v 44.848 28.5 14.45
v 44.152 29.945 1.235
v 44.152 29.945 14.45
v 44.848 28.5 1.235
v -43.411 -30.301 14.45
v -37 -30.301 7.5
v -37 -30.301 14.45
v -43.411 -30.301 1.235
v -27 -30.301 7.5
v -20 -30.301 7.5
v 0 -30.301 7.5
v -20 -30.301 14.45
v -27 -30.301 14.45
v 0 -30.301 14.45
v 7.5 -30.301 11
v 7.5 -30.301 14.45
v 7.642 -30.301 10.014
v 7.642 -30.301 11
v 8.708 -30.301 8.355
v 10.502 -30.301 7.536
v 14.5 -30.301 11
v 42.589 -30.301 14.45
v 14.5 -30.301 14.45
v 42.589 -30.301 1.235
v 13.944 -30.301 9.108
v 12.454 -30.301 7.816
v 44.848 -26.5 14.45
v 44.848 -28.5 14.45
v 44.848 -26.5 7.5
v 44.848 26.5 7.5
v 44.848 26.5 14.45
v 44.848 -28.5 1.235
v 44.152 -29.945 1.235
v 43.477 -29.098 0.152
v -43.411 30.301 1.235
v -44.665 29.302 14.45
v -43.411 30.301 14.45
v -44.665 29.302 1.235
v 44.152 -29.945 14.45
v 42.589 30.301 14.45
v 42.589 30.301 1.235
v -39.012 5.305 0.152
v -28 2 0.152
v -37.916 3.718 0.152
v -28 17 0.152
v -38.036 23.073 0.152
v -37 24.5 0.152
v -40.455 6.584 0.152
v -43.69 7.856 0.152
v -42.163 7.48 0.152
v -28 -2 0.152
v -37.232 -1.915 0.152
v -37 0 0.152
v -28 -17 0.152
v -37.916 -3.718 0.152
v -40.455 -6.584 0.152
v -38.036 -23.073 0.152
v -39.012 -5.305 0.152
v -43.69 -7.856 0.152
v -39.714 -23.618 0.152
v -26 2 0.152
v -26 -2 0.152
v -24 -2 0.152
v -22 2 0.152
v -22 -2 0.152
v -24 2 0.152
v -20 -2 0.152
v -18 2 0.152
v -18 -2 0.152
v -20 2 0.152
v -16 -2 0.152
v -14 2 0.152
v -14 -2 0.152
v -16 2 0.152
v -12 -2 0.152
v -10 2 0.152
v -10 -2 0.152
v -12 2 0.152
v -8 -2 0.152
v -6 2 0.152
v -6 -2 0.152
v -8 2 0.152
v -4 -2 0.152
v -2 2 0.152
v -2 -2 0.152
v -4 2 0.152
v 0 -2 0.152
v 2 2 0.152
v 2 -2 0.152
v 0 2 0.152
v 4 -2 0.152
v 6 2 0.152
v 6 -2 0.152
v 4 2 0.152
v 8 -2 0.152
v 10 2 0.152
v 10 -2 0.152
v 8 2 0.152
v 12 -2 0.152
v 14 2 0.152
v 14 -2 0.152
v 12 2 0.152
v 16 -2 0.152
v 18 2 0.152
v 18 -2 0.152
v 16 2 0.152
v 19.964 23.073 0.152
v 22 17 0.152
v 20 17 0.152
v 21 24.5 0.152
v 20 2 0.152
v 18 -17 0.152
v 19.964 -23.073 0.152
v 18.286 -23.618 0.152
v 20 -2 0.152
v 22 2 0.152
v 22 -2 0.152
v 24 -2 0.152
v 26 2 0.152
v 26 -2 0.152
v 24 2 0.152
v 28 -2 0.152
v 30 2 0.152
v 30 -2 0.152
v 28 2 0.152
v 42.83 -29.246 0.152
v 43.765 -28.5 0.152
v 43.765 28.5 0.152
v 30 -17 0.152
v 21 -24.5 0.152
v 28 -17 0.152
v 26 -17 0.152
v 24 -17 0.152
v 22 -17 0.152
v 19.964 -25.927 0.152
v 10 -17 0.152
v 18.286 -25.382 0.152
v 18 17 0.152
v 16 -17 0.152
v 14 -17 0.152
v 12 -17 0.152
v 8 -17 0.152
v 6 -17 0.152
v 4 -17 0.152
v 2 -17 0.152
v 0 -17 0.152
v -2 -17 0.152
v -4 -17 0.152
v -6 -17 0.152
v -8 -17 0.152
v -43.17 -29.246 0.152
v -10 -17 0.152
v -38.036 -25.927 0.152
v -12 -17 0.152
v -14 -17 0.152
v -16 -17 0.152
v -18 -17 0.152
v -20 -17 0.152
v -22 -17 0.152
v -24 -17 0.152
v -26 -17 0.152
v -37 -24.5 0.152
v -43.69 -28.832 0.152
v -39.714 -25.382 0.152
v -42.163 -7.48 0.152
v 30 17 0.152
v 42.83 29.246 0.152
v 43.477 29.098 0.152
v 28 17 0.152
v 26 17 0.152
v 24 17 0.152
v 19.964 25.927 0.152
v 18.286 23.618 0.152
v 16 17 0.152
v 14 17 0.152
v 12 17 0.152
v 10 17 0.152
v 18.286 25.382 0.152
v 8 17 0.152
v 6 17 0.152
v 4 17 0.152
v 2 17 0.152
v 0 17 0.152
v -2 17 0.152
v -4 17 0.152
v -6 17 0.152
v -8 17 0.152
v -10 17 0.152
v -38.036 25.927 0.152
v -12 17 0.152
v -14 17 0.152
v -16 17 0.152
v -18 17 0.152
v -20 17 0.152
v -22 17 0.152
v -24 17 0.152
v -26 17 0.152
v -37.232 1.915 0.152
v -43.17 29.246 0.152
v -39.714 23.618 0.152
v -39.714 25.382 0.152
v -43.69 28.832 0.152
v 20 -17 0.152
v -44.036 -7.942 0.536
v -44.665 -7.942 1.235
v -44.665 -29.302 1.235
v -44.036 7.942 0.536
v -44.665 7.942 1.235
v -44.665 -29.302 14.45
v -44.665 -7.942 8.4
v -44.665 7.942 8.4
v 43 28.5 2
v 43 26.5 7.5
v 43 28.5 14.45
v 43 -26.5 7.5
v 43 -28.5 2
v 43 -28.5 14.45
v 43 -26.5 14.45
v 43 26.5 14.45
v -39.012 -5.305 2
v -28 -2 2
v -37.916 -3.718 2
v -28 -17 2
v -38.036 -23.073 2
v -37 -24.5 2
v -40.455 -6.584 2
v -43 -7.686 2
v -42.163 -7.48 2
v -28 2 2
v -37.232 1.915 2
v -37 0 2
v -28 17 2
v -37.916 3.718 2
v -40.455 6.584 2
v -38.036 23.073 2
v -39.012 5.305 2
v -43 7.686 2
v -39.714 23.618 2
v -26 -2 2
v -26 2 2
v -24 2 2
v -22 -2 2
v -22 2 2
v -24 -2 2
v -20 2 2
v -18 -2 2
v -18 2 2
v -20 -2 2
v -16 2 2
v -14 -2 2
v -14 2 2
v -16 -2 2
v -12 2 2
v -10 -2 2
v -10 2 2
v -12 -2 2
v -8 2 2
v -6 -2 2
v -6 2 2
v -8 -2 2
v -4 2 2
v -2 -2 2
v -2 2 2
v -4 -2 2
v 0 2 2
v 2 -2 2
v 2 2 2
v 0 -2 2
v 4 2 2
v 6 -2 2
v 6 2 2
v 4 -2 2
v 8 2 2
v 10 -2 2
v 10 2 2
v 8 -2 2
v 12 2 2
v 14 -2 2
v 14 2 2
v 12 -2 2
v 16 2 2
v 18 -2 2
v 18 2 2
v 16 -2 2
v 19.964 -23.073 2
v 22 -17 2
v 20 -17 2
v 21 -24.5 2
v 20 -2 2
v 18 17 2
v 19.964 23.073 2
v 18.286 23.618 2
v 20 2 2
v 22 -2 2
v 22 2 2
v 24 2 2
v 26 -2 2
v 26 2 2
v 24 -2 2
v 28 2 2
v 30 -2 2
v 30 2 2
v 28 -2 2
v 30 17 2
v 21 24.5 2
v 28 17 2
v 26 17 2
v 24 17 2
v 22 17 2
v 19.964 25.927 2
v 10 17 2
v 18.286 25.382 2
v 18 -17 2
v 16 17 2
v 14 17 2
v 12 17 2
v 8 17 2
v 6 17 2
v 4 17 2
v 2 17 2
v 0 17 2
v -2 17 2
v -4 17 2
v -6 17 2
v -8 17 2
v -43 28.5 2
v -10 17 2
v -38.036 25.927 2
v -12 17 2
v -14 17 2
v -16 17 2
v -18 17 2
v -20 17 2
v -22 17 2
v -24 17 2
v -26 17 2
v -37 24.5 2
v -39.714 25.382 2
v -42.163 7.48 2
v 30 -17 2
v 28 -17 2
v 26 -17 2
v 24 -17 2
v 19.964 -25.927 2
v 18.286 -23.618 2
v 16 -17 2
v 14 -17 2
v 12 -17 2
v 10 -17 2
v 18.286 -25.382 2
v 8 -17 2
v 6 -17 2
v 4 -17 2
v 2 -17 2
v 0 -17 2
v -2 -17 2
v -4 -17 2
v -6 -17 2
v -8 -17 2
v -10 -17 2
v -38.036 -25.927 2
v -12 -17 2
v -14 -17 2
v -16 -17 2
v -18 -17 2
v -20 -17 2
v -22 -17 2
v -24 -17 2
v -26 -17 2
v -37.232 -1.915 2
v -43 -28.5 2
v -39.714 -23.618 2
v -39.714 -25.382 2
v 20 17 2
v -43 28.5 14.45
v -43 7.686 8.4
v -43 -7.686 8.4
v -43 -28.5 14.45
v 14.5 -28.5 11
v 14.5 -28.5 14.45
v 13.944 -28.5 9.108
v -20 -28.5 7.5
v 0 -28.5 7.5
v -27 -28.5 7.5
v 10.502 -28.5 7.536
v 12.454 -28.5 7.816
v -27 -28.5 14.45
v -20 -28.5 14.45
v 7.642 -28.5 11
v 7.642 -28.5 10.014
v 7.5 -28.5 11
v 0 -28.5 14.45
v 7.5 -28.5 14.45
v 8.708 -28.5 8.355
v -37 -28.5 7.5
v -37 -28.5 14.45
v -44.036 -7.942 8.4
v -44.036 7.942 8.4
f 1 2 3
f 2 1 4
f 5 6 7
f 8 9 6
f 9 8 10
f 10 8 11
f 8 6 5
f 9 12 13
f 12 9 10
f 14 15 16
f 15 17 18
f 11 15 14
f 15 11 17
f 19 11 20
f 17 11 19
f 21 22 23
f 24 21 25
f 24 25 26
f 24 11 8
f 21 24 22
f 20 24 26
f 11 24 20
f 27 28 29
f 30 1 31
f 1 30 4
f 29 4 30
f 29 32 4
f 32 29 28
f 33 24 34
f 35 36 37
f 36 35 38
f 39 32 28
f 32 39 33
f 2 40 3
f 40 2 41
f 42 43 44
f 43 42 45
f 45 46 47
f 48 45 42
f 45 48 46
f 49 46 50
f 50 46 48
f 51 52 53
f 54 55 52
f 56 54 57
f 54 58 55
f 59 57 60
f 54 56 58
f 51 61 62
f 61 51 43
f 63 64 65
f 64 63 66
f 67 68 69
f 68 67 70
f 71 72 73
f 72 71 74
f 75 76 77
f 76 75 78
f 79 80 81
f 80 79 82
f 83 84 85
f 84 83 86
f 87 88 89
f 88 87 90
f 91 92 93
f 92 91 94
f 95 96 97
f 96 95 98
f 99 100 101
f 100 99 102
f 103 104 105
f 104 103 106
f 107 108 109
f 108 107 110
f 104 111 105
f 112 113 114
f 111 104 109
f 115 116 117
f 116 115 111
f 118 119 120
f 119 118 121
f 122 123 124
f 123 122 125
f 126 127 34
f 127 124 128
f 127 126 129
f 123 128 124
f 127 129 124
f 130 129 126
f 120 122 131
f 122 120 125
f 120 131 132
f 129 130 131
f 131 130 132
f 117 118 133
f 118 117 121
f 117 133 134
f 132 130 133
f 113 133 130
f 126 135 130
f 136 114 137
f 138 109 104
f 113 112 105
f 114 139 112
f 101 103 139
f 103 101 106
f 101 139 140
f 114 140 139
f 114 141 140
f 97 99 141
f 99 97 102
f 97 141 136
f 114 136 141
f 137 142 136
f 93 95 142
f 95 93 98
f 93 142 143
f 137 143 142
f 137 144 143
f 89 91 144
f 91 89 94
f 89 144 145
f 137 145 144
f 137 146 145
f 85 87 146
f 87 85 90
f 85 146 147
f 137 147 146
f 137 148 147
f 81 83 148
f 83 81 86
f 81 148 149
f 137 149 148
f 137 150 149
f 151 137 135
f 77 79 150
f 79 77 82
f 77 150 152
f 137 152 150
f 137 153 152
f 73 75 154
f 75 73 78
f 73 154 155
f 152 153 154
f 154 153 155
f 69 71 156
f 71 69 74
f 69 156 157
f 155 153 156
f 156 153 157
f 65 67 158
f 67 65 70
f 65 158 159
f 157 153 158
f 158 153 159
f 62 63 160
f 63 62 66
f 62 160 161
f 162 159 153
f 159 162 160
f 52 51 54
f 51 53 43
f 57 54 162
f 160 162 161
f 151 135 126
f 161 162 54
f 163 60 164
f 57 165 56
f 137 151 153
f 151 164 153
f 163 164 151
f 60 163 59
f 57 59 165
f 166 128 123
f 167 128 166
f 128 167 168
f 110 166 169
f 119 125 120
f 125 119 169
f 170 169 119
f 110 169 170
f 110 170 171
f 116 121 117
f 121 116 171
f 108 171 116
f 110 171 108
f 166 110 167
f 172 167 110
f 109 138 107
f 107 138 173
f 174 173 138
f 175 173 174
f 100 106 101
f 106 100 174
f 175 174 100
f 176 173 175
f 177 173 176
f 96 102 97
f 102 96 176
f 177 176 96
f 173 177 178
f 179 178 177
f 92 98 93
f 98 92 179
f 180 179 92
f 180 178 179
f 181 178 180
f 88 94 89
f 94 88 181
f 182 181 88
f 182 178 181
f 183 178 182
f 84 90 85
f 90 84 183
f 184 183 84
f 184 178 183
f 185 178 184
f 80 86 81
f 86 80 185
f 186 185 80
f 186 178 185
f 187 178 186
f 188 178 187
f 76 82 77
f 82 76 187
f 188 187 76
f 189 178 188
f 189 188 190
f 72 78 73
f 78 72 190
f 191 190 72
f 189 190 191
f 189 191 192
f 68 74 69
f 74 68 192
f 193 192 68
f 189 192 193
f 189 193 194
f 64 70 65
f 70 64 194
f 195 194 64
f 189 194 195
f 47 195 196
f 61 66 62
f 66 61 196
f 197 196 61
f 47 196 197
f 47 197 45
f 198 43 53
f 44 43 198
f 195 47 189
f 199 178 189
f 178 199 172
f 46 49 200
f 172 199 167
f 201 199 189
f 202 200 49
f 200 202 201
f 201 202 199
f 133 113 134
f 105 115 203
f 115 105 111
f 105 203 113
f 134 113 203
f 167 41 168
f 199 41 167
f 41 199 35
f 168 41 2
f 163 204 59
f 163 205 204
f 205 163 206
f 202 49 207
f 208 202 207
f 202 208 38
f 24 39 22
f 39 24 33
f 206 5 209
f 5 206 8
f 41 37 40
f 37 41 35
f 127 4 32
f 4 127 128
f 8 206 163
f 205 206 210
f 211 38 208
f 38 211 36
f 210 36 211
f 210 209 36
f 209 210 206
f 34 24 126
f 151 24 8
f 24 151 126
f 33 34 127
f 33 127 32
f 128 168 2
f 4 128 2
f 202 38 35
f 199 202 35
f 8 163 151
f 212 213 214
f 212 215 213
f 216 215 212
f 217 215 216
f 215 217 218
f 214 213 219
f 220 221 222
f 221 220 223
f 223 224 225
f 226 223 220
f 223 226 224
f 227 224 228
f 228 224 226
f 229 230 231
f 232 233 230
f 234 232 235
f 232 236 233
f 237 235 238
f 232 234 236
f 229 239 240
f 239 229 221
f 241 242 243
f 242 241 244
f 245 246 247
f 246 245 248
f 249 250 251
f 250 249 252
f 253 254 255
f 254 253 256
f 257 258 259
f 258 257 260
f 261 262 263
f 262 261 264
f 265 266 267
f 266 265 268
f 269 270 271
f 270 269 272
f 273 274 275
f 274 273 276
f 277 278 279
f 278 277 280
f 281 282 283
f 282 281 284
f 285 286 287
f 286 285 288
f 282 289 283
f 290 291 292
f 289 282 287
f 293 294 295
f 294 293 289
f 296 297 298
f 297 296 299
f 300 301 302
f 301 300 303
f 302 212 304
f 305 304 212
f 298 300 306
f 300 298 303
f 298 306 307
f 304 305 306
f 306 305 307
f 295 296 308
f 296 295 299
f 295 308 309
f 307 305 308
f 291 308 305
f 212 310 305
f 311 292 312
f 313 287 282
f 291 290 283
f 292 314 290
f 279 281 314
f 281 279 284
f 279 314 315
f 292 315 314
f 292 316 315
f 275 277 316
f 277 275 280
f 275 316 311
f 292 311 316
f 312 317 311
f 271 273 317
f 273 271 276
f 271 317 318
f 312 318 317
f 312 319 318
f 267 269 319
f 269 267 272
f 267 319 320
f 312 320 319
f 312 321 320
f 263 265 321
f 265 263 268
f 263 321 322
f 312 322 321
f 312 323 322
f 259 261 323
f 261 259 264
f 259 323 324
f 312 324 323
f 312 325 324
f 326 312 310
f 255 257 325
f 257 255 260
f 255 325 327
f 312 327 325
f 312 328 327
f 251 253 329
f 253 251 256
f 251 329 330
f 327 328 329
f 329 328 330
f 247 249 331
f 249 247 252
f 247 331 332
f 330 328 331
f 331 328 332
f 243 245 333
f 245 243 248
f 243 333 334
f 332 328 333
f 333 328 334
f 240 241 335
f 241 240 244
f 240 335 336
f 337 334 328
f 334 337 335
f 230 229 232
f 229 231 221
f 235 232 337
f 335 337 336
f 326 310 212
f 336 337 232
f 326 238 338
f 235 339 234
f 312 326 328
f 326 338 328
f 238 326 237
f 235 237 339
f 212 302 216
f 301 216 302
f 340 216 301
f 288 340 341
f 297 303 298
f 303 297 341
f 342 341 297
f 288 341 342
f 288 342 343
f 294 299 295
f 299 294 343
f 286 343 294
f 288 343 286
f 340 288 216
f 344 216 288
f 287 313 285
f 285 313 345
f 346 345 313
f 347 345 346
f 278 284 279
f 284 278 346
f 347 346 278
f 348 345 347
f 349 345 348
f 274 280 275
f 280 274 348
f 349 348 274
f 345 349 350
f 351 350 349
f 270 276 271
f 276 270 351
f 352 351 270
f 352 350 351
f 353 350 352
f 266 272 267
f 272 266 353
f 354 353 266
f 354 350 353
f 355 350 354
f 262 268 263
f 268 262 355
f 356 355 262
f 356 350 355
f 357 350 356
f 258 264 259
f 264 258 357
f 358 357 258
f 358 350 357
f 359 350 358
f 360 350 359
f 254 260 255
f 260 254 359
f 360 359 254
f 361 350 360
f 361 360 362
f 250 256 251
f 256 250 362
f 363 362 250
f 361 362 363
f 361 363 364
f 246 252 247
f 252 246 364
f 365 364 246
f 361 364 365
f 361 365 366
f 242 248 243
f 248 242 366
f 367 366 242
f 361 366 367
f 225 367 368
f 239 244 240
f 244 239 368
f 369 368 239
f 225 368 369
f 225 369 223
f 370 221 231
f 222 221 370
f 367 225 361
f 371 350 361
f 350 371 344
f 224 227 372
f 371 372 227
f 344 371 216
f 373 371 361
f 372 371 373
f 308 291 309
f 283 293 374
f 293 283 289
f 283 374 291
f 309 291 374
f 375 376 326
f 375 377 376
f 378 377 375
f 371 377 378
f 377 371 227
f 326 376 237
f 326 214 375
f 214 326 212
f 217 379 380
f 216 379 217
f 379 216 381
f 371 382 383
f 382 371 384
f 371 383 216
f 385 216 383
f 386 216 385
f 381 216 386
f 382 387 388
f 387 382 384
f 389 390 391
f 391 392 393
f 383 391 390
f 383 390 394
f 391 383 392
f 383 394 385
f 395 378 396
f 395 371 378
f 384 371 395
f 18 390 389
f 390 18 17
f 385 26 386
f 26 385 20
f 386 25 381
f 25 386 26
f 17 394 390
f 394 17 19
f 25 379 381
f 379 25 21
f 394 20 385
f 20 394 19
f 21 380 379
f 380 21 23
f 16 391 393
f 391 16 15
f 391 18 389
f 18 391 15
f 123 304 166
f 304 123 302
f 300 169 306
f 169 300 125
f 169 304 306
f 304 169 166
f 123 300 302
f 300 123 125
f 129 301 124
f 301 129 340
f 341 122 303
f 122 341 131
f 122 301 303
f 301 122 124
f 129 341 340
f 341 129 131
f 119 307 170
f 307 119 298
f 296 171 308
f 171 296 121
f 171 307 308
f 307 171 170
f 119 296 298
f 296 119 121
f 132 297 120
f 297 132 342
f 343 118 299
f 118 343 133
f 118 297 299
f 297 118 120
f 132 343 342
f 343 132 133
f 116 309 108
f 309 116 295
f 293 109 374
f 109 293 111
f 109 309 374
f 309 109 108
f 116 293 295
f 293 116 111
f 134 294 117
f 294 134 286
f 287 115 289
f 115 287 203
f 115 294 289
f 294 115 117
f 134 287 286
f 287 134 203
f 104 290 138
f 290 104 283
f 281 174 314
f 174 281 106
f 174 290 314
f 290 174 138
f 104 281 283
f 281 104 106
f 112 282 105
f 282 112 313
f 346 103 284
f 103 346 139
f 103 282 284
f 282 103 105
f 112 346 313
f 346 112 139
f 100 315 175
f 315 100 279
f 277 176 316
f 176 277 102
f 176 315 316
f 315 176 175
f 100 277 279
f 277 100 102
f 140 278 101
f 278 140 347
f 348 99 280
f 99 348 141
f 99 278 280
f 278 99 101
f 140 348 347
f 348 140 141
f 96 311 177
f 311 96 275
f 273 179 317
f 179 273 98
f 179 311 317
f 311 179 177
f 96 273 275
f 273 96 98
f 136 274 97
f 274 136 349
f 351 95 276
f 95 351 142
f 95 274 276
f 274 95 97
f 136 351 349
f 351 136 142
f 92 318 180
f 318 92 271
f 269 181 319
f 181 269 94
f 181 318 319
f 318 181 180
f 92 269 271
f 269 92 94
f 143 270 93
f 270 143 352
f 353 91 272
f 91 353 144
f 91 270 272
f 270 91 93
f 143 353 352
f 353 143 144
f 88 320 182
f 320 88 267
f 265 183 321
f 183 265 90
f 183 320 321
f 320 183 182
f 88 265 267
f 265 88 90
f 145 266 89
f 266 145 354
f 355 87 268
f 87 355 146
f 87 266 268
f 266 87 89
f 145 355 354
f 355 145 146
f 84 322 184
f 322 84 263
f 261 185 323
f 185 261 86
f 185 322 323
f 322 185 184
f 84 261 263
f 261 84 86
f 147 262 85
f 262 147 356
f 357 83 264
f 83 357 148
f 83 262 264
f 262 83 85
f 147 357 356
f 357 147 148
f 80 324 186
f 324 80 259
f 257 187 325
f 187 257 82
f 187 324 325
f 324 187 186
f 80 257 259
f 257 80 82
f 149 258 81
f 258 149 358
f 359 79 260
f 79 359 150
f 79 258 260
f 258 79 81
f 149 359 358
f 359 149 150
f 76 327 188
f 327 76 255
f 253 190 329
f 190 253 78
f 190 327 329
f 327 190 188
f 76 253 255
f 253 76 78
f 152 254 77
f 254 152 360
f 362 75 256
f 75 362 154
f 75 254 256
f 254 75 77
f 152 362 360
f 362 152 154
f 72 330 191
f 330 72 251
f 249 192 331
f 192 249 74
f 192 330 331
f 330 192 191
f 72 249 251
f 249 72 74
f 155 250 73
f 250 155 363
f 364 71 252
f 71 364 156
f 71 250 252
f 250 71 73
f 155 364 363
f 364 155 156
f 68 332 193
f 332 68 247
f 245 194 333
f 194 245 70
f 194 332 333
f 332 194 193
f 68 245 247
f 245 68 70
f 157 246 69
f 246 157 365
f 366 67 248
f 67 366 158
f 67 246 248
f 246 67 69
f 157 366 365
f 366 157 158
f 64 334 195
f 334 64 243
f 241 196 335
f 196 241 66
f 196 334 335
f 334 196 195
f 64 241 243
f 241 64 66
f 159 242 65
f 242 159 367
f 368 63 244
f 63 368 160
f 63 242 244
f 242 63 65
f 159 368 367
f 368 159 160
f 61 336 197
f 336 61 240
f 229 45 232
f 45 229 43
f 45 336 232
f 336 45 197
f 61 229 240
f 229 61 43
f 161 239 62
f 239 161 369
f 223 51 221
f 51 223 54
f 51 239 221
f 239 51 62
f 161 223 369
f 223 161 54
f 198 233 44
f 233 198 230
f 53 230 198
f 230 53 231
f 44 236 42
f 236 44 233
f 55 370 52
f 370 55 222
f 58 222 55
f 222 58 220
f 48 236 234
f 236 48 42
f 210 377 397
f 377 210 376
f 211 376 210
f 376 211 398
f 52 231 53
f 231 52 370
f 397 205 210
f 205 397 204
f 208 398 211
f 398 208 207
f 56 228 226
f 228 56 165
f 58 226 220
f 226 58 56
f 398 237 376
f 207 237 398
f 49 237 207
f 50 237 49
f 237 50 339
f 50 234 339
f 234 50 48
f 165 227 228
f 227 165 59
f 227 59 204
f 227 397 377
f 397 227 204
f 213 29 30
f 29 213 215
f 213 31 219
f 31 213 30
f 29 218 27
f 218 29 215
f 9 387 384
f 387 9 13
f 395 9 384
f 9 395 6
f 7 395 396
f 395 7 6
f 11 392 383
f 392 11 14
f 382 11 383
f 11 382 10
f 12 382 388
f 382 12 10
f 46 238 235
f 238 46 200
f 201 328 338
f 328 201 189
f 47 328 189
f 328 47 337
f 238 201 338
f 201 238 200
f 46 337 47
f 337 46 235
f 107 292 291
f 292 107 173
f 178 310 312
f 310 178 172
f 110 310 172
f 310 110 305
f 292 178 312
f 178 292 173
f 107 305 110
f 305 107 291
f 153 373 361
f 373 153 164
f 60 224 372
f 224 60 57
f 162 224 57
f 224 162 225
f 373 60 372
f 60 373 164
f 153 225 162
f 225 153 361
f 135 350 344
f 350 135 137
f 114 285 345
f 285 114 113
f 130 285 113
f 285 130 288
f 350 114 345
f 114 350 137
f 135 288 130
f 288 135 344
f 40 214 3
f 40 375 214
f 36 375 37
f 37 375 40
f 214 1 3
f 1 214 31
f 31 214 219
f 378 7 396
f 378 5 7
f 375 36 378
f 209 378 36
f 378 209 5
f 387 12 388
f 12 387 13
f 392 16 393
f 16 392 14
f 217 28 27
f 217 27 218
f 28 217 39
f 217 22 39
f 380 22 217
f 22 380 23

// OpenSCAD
// file: whole.scad
include <./common.scad>

module box_inner(){
    cube([box_length_inner, box_width_inner, box_height_inner], center = true);
}

module screen_screw_hole(){
translate([
    -box_length_outer/2-collision_spacer,
   0,
    box_height_inner])
rotate([0,90,0])
cylinder(h=box_border_size+collision_spacer*2,d=screen_screw_diameter);
}

module upper_vent_hole(){
translate([
            -box_length_inner/2+upper_vent_width/2+upper_vent_offset,
            0,
            box_height_inner+box_border_size-collision_spacer])
        difference(){
            union(){
                cylinder(d=upper_vent_diameter,h=box_border_size+collision_spacer*2,center=false );
                relative_hole_offset=upper_vent_width/2-upper_vent_hole_offset;
                translate([relative_hole_offset, relative_hole_offset, 0])
                cylinder(r=upper_vent_hole_radius,h=box_border_size+collision_spacer*2,center=false );
                translate([-relative_hole_offset, relative_hole_offset, 0])
                cylinder(r=upper_vent_hole_radius,h=box_border_size+collision_spacer*2,center=false );
                translate([relative_hole_offset,-relative_hole_offset, 0])
                cylinder(r=upper_vent_hole_radius,h=box_border_size+collision_spacer*2,center=false );
                translate([-relative_hole_offset, -relative_hole_offset, 0])
                cylinder(r=upper_vent_hole_radius,h=box_border_size+collision_spacer*2,center=false );
            }
            
            cylinder(d=upper_vent_inner_diameter,h=box_border_size+collision_spacer*2,center=false );
            
            translate([0,-upper_vent_bridge_width/2,0])
            cube([upper_vent_width/2,upper_vent_bridge_width,box_border_size+collision_spacer*2]);
            
            rotate([0,0,120])
            translate([0,-upper_vent_bridge_width/2,0])
            cube([upper_vent_width/2,upper_vent_bridge_width,box_border_size+collision_spacer*2]);
            
            rotate([0,0,240])
            translate([0,-upper_vent_bridge_width/2,0])
            cube([upper_vent_width/2,upper_vent_bridge_width,box_border_size+collision_spacer*2]);
        }
}

module box_whole(){
    difference(){
        translate([0,0,box_border_size + box_height_inner/2])
        difference(){
            minkowski(){
                box_inner();
                sphere(r=box_border_size);
            };
            
            // inner
            box_inner();
        }
        
        slot_depth = box_border_size+collision_spacer *2;
        
        // sd card slot
        
        translate([- box_length_outer/2,0,sdcard_slot_height/2 -collision_spacer])
        cylinder(h = sdcard_slot_height, r=sdcard_slot_radius, center= true);
        
        // usb and rj45
        translate([
            box_length_inner/2 + box_border_size/2 -collision_spacer, 
            0, 
            box_border_size + usb_height/2 + board_height+spacer_lower])
        cube([slot_depth,box_width_inner -4,usb_height],center=true);
        
        // audio jack
        translate([
            - box_length_inner/2+ minijack_offset,
            -box_width_outer/2 + box_border_size + collision_spacer,
            box_border_size+board_height+spacer_lower + minijack_diameter/2])
        rotate([90,0,0])
        union(){
            cylinder(d = minijack_diameter, h = slot_depth);
            translate([-minijack_diameter/2,0,0])
            cube([minijack_diameter,minijack_diameter/2,slot_depth],center=false);
        }
        
        // power usb
        translate([
            -box_length_inner/2+power_offset-power_width/2,
            -box_width_inner/2 - box_border_size + collision_spacer,
            box_border_size + spacer_lower + board_height])
        cube([power_width,slot_depth,power_height], center=false);
        
        // hdmi
        translate([
            -box_length_inner/2+hdmi_offset-hdmi_width/2,
            -box_width_inner/2 - box_border_size + collision_spacer,
            box_border_size + spacer_lower + board_height])
        cube([hdmi_width,slot_depth,hdmi_height], center=false);
        
        // bottom ventilation gaps
        low_vent_total_length = low_vent_rows * (low_vent_spread_y + low_vent_width);
        for(i=[0:low_vent_rows]){
            translate([low_vent_total_length/2 - low_vent_spread_x*i, low_vent_spread_y,0])
            cube([low_vent_width,low_vent_length,box_border_size+collision_spacer*2]);
            
            mirror([0,1,0])
            translate([low_vent_total_length/2 - low_vent_spread_x*i, low_vent_spread_y,0])
            cube([low_vent_width,low_vent_length,box_border_size+collision_spacer*2]);            
        }
        
        // screw holes bottom    
        translate([-box_length_inner/2+screw_offset_x_front,box_width_inner/2-screw_offset_y,-collision_spacer])
        cylinder(r=screw_radius,h=box_border_size+collision_spacer*2);
        
        translate([-box_length_inner/2+screw_offset_x_front + screw_distance_x,box_width_inner/2-screw_offset_y,-collision_spacer])
        cylinder(r=screw_radius,h=box_border_size+collision_spacer*2);
        
        translate([-box_length_inner/2+screw_offset_x_front,-box_width_inner/2+screw_offset_y,-collision_spacer])
        cylinder(r=screw_radius,h=box_border_size+collision_spacer*2);
        
        translate([-box_length_inner/2+screw_offset_x_front + screw_distance_x,-box_width_inner/2+screw_offset_y,-collision_spacer])
        cylinder(r=screw_radius,h=box_border_size+collision_spacer*2);
        
        // screw holes top    
        translate([-box_length_inner/2+screw_offset_x_front,box_width_inner/2-screw_offset_y,box_height_inner+box_border_size-collision_spacer])
        cylinder(r=screw_radius,h=box_border_size+collision_spacer*2);
        
        translate([-box_length_inner/2+screw_offset_x_front + screw_distance_x,box_width_inner/2-screw_offset_y,box_height_inner+box_border_size-collision_spacer])
        cylinder(r=screw_radius,h=box_border_size+collision_spacer*2);
        
        translate([-box_length_inner/2+screw_offset_x_front,-box_width_inner/2+screw_offset_y,box_height_inner+box_border_size-collision_spacer])
        cylinder(r=screw_radius,h=box_border_size+collision_spacer*2);
        
        translate([-box_length_inner/2+screw_offset_x_front + screw_distance_x,-box_width_inner/2+screw_offset_y,box_height_inner+box_border_size-collision_spacer])
        cylinder(r=screw_radius,h=box_border_size+collision_spacer*2);
        
        // screen
        screen_bottom_offset=box_height_inner-screen_inner_offset-screen_height;
        
        translate([-box_length_outer/2+collision_spacer+box_border_size,-screen_width/2,screen_bottom_offset])
        rotate([0,0,90])
        cube([screen_width,box_border_size+collision_spacer*2,screen_height]);
        
        // screen screw holes
        translate([0,screen_width/2-screen_screew_offset,-screen_screew_offset])
        screen_screw_hole();
        translate([0,-screen_width/2+screen_screew_offset,-screen_screew_offset])
        screen_screw_hole();
        translate([0,screen_width/2-screen_screew_offset,-screen_height_outer+screen_screw_diameter+screen_screew_offset])
        screen_screw_hole();
        translate([0,-screen_width/2+screen_screew_offset,-screen_height_outer+screen_screw_diameter+screen_screew_offset])
        screen_screw_hole();
        
        // upper vent
        upper_vent_hole();
    }
}


// view
box_whole();
// file: common.scad
// common

board_height = 1.5;

usb_height = 16;

screen_width=22;
screen_width_outer=24;
screen_height = 12;
screen_inner_offset=5;
screen_screw_diameter=3;
screen_screew_offset=1;
screen_height_outer=27;

minijack_diameter = 7;
minijack_offset = 54;

spacer_lower = 4;

box_length_inner = 86;
box_width_inner = 57;
box_height_inner = spacer_lower + board_height + minijack_diameter+screen_height_outer;

box_border_size = 2;

box_length_outer= box_length_inner + box_border_size*2;
box_width_outer = box_width_inner+ box_border_size*2;
box_height_outer = box_height_inner+ box_border_size*2;

sdcard_slot_height = 2.5 + spacer_lower + box_border_size;
sdcard_slot_radius= 8;
        
power_height= 7;
power_width = 10;
power_offset = 11;

hdmi_height = power_height;
hdmi_width = 20;
hdmi_offset= 33; 

low_vent_rows=14;
low_vent_length=15;
low_vent_width = 2;
low_vent_spread_x=4;
low_vent_spread_y=2;

screw_offset_y = 4;
screw_offset_x_front = 4.5;
screw_distance_x= 58;
screw_radius=1.5;

upper_vent_width=40;
upper_vent_diameter=38;
upper_vent_inner_diameter=24;
upper_vent_hole_radius=1.5;
upper_vent_hole_offset=3;
upper_vent_bridge_width=3;
upper_vent_offset=16;

collision_spacer = 0.1;
box_lower_height = box_border_size+ board_height+spacer_lower + minijack_diameter;
// main file
include <./common.scad>
use <./whole.scad>

module box_lower(){
    difference(){
        box_whole();
        
        translate([0,0,box_height_outer/2 + box_lower_height])
        cube([
            box_length_outer+collision_spacer, 
            box_width_outer +collision_spacer,
            box_height_outer +collision_spacer
        ], center= true);
    }
}
box_lower();
